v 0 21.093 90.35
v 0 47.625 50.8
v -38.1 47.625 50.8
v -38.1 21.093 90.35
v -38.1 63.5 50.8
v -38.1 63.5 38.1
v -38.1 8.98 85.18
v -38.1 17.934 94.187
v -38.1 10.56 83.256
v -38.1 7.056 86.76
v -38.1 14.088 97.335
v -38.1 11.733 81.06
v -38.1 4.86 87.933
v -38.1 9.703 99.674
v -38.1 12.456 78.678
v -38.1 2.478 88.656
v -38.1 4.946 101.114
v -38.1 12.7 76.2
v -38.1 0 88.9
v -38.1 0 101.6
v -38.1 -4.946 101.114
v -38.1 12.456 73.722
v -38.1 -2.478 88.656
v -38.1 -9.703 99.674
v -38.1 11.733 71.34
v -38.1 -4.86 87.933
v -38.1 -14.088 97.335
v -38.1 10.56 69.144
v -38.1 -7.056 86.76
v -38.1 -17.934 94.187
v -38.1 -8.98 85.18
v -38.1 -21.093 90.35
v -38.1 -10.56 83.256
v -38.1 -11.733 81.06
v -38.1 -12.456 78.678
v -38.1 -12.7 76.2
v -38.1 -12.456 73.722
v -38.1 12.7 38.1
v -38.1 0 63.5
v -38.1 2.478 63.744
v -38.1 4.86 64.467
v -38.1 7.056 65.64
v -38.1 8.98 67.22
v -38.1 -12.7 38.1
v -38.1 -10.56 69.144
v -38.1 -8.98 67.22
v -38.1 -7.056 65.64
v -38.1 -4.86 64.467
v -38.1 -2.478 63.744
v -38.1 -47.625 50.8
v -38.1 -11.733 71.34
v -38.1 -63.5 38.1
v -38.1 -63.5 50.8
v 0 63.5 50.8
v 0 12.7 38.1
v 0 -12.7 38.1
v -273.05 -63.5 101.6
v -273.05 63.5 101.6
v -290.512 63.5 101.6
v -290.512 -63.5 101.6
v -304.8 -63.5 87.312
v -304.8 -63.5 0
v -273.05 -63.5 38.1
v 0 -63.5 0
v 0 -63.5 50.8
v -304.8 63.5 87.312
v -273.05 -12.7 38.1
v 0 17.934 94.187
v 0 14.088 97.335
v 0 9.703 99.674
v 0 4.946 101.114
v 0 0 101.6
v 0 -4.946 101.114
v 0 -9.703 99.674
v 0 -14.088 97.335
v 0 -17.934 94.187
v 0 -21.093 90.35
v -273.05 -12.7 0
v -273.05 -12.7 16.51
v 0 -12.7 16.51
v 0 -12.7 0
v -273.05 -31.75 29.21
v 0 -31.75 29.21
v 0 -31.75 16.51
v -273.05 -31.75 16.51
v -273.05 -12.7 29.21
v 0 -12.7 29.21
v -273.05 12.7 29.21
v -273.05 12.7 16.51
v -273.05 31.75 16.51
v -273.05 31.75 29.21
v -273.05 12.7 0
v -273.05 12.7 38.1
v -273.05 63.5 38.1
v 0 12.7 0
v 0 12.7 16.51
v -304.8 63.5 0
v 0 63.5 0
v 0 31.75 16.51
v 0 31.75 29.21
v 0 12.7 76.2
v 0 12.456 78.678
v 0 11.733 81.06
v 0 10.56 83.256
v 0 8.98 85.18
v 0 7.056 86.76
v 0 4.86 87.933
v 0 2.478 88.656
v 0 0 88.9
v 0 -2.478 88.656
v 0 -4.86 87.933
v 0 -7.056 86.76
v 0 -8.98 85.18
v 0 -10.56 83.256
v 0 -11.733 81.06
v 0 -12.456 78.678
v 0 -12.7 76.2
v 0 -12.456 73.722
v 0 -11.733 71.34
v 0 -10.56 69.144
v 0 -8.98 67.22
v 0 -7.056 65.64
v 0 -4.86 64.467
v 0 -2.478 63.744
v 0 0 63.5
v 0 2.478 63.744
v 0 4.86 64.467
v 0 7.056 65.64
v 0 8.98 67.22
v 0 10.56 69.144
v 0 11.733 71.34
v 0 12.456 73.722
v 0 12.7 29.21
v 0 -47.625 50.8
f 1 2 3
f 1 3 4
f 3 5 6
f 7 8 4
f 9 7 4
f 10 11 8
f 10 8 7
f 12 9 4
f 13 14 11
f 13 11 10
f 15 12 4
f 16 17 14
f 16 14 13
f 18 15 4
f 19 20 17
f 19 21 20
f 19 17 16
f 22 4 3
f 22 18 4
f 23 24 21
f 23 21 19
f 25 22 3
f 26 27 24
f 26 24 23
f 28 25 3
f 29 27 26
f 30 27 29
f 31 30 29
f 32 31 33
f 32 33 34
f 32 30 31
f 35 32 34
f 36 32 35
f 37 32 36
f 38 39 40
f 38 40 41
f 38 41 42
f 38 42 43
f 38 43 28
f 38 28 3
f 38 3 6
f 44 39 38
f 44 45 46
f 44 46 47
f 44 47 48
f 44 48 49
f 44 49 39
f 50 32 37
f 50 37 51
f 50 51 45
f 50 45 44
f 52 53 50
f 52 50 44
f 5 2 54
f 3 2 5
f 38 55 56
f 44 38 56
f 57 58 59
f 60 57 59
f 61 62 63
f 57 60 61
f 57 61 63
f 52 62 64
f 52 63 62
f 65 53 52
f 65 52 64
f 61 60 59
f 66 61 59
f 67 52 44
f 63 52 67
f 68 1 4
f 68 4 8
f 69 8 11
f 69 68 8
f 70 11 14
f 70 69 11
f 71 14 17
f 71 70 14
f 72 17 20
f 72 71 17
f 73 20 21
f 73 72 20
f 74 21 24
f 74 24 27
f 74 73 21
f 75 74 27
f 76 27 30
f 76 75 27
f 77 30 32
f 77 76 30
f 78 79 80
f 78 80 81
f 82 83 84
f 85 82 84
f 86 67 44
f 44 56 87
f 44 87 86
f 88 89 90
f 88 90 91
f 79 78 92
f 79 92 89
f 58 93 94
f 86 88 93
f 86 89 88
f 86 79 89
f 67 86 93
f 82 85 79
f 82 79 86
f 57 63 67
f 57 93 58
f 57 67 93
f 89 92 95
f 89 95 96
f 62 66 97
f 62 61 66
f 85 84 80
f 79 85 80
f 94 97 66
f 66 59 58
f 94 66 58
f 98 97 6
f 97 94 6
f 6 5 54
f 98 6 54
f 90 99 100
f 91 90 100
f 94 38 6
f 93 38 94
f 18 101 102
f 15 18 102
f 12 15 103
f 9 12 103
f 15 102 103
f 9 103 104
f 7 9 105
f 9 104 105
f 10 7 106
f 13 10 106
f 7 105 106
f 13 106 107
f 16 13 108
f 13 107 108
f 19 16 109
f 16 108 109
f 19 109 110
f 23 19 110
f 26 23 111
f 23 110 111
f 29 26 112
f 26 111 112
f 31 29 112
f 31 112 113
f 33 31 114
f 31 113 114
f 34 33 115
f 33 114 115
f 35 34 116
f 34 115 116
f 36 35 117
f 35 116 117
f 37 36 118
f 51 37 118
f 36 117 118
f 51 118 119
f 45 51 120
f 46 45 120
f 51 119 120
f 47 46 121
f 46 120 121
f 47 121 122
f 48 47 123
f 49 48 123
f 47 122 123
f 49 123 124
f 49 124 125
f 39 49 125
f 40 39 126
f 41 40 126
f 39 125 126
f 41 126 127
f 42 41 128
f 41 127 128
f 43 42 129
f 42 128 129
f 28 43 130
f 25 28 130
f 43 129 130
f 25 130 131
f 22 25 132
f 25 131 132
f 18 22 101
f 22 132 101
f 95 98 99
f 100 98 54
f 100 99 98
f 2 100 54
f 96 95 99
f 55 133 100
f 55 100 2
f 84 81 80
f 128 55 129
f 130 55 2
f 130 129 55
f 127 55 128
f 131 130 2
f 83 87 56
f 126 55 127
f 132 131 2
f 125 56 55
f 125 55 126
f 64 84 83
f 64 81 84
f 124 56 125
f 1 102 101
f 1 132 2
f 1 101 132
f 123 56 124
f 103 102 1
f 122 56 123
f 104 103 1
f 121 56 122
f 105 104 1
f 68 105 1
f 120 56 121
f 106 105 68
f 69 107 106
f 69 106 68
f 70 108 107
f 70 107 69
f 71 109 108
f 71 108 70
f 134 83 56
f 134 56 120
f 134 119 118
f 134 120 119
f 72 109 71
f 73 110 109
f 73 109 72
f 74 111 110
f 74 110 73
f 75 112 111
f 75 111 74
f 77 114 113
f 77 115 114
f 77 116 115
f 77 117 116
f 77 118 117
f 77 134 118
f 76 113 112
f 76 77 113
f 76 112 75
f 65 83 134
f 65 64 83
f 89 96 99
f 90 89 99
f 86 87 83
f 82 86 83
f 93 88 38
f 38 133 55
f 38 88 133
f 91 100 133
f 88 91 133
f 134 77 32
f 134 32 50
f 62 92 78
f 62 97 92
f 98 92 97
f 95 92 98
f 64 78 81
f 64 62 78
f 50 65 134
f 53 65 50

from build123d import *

# Parameters (mm, degrees)
F1_DEPTH = 63.5
F2_SIZE  = 14.2875
F3_R     = 12.7
F4_DEPTH = 38.1
F5_DEPTH = 273.05


with BuildPart() as f1:
    # F0 (on Front) → F1 (new body, symmetric)
    with BuildSketch(Plane.XZ):
        Polygon((-304.8, 0), (0, 0), (0, 50.8), (-38.1, 50.8), (-38.1, 38.1), (-273.05, 38.1), (-273.05, 101.6), (-304.8, 101.6), align=None)
    extrude(amount=F1_DEPTH, both=True)

    # F2
    f2_edges = [f1.edges().sort_by_distance(p)[0] for p in [
        (-304.8, 0, 101.6),
    ]]
    chamfer(f2_edges, length=F2_SIZE)

    # F3 (on Right) → F4 (join)
    with BuildSketch(Plane.YZ):
        with BuildLine():
            Line((-21.093426, 90.350173), (-47.625, 50.8))
            Line((-47.625, 50.8), (47.625, 50.8))
            Line((47.625, 50.8), (21.093426, 90.350173))
            ThreePointArc((21.093426, 90.350173), (0, 101.6), (-21.093426, 90.350173))
        make_face()
        with Locations((0, 76.2)):
            Circle(F3_R, mode=Mode.SUBTRACT)
    extrude(amount=-F4_DEPTH)

    # F3 (on Right) → F5 (cut)
    with BuildSketch(Plane.YZ):
        Polygon((-12.7, 16.51), (-12.7, 0), (12.7, 0), (12.7, 16.51), (31.75, 16.51), (31.75, 29.21), (12.7, 29.21), (12.7, 38.1), (-12.7, 38.1), (-12.7, 29.21), (-31.75, 29.21), (-31.75, 16.51), align=None)
    extrude(amount=-F5_DEPTH, mode=Mode.SUBTRACT)


solid = f1.part
